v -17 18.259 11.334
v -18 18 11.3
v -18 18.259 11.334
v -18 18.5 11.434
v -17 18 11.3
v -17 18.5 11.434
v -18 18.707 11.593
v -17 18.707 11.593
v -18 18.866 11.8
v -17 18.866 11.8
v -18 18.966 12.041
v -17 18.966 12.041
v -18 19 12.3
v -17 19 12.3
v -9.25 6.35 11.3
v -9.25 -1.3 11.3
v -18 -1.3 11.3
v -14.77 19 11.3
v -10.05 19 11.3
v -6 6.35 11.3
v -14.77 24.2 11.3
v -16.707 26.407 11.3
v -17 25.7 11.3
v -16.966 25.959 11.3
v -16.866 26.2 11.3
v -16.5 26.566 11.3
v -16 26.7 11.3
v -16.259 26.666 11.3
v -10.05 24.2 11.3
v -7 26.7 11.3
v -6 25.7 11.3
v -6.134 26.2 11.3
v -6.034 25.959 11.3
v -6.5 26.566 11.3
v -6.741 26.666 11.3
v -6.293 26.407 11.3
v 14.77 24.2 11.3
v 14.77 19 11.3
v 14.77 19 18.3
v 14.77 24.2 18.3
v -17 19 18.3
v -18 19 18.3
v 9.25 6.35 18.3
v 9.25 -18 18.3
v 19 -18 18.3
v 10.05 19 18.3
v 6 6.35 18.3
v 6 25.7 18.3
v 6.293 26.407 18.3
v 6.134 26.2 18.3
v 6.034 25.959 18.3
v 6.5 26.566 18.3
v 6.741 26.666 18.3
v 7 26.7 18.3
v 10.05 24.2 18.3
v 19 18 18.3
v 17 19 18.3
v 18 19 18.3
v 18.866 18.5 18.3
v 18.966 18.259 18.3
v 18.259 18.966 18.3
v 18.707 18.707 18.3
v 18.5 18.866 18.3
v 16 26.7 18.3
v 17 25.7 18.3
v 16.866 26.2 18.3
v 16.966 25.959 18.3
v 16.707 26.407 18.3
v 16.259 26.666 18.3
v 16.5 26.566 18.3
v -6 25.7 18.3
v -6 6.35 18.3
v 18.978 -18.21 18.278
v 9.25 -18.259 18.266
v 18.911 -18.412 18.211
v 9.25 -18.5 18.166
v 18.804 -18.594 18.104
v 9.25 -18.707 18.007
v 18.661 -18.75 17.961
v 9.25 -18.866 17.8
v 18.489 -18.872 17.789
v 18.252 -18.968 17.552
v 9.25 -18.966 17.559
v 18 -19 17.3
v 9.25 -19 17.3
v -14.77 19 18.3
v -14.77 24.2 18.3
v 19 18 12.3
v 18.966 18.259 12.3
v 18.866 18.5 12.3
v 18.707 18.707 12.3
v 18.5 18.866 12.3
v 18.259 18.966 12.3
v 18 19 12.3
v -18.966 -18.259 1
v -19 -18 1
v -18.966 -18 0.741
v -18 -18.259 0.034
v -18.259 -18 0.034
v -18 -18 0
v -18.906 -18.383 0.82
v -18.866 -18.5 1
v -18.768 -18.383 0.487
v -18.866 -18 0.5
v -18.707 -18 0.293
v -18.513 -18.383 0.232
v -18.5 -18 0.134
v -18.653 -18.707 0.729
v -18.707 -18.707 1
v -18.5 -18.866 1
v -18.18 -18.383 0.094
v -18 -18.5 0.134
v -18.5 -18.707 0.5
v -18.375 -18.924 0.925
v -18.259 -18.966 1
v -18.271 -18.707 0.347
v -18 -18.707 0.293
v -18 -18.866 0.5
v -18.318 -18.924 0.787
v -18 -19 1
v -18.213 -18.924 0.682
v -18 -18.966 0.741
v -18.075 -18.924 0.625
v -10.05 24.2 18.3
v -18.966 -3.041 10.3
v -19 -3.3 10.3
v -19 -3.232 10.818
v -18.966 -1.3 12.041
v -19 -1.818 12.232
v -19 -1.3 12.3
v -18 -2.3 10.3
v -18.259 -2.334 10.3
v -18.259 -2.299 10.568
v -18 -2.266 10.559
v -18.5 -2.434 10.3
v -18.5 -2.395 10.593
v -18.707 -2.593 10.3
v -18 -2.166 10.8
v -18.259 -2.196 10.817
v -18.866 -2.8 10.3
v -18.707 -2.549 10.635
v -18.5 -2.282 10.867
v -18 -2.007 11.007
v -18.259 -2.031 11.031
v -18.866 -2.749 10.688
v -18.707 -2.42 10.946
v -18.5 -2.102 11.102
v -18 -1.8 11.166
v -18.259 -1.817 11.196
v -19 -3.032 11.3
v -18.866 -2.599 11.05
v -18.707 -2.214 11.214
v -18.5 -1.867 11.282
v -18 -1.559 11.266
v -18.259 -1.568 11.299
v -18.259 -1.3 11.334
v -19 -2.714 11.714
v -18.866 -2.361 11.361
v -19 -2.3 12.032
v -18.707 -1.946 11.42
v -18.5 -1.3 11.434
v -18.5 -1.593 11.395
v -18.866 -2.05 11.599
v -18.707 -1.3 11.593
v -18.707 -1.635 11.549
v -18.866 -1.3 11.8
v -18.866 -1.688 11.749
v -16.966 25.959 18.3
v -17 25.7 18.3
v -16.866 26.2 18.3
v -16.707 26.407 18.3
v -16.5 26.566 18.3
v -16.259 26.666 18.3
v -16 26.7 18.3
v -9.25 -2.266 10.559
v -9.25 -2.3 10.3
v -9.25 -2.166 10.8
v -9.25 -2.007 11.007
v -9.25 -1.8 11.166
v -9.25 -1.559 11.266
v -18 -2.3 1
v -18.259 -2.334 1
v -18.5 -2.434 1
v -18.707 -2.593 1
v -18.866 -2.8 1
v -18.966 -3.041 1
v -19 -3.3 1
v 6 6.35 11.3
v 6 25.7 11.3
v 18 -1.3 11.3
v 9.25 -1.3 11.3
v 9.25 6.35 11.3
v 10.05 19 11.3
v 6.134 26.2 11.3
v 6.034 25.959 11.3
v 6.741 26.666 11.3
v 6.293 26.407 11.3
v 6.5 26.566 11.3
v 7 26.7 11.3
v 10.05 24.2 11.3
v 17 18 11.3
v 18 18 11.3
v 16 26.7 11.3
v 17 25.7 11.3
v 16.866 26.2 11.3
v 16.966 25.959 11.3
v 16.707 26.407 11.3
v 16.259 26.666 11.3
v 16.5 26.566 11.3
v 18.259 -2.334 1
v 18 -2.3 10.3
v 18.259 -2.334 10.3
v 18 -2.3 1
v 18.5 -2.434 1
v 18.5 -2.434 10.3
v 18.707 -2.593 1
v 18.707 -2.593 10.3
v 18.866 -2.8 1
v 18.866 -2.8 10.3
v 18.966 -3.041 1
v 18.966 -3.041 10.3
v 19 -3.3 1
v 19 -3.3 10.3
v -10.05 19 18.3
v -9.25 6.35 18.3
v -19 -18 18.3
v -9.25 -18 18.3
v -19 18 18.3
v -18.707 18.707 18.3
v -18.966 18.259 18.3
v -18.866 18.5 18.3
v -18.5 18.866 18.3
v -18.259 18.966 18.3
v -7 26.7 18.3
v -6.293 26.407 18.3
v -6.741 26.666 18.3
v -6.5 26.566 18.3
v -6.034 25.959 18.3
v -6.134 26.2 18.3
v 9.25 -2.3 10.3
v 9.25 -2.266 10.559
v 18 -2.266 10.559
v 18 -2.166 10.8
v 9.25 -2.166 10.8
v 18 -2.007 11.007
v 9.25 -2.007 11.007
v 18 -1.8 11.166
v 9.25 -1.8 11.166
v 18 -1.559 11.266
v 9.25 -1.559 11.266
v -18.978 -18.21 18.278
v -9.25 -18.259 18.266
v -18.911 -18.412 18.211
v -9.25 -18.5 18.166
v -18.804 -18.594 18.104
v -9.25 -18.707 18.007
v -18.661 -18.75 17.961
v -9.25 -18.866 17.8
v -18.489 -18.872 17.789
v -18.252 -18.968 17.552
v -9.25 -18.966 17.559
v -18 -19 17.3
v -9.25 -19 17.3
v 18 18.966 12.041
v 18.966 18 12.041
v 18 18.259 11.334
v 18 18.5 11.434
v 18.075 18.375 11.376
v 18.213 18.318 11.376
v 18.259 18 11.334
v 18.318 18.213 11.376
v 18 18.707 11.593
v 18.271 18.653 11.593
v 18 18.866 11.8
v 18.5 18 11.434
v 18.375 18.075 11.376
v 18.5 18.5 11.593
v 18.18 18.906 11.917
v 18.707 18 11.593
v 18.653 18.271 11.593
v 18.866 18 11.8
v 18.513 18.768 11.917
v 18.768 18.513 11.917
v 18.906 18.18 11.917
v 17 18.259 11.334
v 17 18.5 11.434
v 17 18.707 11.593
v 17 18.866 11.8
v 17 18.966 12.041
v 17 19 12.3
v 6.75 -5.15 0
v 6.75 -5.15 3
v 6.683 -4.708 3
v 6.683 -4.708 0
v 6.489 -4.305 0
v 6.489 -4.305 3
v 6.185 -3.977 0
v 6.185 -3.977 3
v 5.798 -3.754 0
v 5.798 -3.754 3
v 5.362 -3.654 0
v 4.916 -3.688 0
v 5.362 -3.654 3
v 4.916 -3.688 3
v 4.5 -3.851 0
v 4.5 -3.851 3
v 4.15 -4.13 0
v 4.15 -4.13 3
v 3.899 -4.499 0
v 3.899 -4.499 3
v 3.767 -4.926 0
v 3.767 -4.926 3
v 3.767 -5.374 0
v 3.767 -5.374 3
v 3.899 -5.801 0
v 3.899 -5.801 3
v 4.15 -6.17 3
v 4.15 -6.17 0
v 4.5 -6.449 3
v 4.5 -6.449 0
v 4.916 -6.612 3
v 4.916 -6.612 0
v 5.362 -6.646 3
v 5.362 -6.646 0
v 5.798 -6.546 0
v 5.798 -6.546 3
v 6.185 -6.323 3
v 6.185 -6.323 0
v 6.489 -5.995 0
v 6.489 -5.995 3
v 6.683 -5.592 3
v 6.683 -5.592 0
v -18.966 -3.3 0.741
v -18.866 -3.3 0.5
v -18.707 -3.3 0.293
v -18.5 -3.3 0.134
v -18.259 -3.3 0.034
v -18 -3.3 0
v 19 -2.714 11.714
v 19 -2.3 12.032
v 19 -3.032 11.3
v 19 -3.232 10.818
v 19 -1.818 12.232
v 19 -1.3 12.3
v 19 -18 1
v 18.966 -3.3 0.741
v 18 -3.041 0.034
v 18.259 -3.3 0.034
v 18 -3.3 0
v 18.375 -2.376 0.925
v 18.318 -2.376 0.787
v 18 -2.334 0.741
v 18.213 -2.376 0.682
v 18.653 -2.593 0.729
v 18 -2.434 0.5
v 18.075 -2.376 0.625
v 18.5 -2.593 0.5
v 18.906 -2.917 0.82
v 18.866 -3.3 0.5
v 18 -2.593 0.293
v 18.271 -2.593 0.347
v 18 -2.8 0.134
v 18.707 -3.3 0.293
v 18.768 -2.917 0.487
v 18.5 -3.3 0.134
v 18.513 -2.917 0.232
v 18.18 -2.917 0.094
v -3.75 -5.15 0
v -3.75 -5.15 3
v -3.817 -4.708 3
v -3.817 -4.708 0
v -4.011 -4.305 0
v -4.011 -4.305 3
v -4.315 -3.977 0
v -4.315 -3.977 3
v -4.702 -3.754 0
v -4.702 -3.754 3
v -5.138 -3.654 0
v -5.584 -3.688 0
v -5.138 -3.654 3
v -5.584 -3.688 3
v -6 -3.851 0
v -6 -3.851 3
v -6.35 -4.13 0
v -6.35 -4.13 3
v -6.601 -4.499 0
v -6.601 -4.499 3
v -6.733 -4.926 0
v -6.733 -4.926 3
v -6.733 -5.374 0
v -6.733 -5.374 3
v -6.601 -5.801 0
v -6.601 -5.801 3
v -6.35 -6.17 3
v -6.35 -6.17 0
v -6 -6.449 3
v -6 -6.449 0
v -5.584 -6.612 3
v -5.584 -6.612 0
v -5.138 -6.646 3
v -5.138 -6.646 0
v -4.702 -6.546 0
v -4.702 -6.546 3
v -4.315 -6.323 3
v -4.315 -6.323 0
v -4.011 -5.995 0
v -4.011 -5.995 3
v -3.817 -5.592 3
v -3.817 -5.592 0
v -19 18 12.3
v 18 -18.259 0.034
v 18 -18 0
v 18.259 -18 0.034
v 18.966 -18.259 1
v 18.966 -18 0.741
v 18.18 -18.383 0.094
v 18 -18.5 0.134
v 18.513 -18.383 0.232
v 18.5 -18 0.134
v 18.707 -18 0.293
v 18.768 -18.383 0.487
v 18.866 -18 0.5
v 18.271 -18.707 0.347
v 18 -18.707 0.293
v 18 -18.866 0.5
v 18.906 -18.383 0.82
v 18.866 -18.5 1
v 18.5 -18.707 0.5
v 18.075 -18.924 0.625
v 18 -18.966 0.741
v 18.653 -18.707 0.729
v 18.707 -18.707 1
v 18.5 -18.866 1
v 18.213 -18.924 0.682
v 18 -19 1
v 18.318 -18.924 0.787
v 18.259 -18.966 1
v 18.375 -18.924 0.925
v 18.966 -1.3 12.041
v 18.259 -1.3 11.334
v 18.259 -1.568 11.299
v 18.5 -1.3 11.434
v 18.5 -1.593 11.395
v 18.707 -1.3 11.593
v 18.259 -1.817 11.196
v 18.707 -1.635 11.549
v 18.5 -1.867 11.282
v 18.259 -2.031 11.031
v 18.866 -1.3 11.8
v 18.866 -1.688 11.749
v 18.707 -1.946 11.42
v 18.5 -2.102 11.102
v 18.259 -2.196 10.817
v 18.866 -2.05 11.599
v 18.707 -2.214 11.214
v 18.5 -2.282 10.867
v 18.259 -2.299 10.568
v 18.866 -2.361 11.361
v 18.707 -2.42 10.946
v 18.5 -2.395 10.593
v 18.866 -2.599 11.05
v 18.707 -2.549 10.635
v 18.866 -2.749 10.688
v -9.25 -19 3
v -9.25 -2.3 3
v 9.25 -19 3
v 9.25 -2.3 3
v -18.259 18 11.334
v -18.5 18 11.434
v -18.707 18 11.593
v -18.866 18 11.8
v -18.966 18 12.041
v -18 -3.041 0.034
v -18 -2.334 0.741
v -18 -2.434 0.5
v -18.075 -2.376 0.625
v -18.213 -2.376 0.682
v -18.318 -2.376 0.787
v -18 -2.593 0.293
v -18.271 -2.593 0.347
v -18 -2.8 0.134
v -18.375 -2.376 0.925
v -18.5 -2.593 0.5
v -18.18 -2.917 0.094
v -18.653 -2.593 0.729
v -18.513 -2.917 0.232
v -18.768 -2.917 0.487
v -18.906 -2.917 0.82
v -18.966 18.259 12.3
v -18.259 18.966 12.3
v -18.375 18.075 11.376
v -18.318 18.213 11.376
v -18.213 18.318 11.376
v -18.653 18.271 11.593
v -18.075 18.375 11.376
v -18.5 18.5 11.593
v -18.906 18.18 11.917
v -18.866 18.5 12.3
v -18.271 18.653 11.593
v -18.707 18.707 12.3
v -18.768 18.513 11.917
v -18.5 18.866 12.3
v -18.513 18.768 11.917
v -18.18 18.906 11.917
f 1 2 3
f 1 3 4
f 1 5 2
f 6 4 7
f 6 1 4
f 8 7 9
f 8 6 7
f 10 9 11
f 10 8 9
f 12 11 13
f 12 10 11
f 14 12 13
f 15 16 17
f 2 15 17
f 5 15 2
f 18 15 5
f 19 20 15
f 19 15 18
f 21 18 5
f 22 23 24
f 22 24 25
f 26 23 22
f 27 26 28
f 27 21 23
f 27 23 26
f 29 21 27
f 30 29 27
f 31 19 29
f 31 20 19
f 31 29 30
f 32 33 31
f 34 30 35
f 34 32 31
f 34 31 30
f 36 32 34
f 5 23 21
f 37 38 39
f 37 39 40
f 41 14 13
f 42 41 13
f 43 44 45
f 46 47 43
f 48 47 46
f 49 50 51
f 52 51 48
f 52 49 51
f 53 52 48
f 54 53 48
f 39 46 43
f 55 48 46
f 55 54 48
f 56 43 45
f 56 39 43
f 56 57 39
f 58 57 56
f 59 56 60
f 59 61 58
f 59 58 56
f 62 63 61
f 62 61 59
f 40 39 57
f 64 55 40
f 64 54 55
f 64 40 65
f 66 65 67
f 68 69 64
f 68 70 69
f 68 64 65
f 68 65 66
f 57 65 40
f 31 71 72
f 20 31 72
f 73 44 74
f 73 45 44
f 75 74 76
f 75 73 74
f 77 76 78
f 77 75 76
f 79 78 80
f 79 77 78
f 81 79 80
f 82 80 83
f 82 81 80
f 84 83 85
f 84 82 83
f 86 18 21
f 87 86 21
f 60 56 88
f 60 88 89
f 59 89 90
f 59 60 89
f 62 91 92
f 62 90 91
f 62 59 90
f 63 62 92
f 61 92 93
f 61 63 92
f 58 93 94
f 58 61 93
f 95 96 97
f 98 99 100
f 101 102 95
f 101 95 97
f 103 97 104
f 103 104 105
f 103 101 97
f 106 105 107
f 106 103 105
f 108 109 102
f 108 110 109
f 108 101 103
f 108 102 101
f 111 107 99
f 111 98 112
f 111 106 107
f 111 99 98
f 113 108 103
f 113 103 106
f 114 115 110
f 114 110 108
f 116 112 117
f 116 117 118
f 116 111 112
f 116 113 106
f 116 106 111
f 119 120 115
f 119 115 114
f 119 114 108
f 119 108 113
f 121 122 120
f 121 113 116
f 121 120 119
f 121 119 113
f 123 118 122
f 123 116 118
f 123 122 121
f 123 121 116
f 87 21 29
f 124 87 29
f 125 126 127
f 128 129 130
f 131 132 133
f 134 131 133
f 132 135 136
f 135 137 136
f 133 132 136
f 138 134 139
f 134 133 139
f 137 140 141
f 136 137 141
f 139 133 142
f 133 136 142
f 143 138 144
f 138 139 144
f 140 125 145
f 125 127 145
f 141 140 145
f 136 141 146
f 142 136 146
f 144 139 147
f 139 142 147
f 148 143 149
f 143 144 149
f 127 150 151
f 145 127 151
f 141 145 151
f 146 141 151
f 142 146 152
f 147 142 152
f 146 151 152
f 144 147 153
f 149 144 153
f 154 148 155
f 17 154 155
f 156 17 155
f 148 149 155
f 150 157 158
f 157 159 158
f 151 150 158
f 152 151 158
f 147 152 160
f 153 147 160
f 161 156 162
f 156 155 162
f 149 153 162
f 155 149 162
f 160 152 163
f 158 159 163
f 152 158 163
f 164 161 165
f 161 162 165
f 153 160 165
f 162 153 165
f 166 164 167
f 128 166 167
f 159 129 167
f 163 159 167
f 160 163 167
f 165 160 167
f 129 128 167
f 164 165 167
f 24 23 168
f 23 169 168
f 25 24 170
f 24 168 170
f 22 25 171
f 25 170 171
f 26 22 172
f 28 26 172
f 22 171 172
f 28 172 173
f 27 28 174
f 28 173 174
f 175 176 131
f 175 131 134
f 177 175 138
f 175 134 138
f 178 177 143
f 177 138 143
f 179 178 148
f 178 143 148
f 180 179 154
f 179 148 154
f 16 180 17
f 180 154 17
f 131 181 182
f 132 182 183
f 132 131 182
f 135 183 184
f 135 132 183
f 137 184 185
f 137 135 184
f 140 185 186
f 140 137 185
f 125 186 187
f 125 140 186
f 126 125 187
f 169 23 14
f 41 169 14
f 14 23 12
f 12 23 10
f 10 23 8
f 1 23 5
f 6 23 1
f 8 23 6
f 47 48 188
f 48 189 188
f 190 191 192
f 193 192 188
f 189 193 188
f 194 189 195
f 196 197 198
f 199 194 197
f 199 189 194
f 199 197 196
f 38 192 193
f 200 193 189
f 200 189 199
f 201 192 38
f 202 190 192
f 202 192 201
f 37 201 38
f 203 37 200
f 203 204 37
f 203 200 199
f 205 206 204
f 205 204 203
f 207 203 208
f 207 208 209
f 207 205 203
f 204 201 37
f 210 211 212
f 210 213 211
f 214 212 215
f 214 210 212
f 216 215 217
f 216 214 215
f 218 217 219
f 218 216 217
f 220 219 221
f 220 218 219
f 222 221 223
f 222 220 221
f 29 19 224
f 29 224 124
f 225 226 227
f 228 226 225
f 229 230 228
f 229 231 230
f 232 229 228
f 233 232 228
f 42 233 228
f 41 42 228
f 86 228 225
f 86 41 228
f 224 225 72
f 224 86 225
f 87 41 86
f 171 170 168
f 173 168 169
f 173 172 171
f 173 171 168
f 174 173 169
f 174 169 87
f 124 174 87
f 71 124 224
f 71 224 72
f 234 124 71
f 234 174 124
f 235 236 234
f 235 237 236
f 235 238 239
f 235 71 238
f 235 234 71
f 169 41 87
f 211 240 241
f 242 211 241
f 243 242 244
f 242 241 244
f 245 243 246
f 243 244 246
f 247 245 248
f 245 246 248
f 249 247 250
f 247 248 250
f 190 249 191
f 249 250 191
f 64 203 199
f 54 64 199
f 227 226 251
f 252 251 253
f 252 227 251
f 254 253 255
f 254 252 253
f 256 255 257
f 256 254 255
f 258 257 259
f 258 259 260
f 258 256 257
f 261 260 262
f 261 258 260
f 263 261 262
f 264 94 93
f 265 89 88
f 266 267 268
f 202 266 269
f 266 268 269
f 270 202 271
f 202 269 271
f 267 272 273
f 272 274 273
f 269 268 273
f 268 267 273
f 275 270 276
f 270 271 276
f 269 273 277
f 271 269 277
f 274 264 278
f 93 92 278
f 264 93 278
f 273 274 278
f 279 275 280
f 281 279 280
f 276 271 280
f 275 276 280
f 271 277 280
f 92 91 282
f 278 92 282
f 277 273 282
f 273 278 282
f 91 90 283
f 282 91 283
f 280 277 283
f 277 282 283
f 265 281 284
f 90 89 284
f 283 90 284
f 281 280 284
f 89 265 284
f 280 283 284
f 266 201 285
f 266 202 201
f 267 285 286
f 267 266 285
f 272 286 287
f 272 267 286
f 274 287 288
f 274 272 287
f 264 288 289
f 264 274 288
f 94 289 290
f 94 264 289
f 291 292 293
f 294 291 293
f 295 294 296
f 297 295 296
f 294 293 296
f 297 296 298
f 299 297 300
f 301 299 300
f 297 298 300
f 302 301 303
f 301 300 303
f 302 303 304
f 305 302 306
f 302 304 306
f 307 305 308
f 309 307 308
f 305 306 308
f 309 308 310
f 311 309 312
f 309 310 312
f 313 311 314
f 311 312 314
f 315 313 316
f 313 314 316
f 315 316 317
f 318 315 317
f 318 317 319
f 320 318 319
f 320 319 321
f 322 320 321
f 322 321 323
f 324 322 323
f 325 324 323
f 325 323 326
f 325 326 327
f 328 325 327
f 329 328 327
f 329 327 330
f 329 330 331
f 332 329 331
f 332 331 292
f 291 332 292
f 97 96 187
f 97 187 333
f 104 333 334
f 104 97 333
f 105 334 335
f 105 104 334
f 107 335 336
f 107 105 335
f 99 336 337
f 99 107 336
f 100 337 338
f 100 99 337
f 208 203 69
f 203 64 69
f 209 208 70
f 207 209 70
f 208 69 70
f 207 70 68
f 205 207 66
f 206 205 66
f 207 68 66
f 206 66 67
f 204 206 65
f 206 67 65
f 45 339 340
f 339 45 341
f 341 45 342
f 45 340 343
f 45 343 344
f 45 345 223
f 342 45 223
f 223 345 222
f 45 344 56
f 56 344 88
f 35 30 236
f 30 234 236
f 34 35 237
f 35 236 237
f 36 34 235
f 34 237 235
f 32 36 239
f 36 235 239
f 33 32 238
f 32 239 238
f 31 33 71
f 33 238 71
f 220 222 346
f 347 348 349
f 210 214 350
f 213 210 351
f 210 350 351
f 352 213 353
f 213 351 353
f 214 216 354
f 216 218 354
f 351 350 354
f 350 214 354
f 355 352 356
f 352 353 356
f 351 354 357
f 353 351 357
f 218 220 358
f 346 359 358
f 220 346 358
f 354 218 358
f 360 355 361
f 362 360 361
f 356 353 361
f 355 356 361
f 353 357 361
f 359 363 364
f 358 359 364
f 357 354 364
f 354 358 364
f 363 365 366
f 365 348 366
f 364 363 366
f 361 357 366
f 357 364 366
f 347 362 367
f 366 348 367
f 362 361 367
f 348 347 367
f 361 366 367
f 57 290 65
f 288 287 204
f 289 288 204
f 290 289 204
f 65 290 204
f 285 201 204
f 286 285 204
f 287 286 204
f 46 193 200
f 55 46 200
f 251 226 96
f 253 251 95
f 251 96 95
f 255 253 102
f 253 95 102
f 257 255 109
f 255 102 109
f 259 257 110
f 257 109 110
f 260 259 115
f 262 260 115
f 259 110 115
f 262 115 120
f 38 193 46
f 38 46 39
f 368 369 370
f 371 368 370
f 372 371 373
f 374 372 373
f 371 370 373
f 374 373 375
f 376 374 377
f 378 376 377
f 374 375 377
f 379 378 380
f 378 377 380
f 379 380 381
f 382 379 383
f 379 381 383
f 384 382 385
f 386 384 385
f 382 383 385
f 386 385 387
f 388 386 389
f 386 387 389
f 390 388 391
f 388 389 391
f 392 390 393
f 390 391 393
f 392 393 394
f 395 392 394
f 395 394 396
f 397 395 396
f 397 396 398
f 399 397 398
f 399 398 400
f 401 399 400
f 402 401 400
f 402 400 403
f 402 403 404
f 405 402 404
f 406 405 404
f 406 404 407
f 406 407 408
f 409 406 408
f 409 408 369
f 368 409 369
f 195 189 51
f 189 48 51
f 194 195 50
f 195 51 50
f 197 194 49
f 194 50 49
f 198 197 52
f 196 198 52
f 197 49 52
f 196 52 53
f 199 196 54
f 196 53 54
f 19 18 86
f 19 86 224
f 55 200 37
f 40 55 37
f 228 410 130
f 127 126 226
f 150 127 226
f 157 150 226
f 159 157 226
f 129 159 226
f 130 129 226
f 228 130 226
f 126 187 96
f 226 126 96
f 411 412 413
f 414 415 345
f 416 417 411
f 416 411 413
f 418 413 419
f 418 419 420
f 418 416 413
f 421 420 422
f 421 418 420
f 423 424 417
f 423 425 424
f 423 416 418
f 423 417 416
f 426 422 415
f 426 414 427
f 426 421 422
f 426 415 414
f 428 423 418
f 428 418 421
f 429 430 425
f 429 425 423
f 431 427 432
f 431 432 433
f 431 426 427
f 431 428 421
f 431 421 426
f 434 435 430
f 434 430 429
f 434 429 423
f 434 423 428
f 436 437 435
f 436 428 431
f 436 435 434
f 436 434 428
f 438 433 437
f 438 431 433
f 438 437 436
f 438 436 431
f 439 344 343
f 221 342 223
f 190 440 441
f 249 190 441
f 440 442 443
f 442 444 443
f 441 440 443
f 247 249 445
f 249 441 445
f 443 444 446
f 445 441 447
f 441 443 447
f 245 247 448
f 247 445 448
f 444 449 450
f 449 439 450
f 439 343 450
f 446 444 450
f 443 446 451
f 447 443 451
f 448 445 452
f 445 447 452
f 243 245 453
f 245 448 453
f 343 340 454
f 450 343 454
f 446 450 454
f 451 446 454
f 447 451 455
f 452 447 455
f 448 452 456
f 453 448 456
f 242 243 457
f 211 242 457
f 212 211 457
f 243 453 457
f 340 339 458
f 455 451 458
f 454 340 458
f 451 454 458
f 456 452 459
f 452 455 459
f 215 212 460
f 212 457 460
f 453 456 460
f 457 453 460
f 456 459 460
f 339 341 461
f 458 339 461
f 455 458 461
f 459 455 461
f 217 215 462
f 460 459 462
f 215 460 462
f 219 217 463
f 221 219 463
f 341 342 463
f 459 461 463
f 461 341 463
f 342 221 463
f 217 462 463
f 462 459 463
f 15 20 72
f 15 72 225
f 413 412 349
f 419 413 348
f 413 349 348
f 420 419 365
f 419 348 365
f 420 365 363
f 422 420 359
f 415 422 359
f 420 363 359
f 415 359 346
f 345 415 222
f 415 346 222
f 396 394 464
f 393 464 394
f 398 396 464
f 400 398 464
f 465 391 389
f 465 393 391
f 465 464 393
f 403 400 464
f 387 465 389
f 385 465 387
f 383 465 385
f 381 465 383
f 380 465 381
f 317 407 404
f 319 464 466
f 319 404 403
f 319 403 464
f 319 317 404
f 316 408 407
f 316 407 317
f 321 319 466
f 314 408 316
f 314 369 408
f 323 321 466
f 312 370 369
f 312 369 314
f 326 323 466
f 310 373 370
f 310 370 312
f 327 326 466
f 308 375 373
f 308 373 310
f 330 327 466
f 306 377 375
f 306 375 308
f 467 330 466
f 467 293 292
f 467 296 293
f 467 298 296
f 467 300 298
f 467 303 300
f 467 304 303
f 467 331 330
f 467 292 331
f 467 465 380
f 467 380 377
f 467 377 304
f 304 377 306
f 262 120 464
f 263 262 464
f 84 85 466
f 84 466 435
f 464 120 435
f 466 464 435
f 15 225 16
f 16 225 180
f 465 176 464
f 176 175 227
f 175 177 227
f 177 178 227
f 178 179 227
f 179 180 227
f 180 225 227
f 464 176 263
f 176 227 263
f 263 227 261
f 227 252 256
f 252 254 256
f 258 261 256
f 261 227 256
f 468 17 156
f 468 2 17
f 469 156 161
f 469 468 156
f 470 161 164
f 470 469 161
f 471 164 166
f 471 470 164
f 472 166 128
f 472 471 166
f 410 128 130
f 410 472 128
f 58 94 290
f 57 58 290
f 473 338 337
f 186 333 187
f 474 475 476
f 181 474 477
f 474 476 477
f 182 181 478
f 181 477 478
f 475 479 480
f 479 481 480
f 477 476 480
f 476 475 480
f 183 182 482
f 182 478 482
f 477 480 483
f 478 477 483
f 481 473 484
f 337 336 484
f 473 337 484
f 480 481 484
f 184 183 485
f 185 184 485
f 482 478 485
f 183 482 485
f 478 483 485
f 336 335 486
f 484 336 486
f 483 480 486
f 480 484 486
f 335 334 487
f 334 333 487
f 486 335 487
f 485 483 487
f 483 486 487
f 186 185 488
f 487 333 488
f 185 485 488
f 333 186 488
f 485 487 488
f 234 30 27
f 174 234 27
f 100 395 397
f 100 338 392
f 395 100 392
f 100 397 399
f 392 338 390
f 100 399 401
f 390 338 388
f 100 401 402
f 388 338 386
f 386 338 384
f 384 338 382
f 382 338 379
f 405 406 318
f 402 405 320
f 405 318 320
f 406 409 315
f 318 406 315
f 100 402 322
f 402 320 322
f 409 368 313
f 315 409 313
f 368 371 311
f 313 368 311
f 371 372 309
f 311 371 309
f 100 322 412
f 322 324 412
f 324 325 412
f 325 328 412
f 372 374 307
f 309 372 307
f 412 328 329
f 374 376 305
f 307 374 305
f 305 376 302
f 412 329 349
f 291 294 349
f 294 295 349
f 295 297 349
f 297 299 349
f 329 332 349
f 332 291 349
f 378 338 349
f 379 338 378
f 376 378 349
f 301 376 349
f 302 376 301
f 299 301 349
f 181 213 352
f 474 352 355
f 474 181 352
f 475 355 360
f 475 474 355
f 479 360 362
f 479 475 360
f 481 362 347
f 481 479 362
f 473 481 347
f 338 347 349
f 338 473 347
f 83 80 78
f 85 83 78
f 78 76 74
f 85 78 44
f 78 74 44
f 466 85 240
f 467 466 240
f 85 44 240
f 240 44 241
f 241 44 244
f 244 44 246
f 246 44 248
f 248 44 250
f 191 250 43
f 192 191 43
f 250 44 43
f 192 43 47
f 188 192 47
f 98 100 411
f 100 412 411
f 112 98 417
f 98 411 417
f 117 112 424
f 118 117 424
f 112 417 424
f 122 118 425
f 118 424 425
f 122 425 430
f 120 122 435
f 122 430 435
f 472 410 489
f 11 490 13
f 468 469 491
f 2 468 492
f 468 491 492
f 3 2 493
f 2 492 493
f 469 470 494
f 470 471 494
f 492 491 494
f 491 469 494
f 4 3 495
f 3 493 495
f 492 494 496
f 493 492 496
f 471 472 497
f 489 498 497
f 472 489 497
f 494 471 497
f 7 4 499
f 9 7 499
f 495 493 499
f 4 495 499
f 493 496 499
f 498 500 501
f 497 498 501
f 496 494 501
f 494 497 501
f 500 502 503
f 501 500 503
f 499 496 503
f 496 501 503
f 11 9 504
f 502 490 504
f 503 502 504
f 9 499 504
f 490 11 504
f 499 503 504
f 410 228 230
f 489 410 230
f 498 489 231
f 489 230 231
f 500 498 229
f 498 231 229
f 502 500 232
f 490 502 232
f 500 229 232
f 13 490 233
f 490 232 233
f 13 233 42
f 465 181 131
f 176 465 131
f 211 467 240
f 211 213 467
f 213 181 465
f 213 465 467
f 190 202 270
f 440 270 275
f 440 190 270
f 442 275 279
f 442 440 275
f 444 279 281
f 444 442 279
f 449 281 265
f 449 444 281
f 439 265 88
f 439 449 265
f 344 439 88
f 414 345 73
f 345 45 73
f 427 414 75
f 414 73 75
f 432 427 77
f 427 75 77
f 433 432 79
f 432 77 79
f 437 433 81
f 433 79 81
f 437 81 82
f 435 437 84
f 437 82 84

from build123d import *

# Parameters (mm, degrees)
SKETCH_W        = 4.72
SKETCH_H        = 5.2
PAD_DEPTH       = 18.3
SKETCH001_W     = 29
SKETCH001_H     = 11.3
POCKET_DEPTH    = 38.001
POCKET005_DEPTH = 15.3
SKETCH003_R     = 1.5
POCKET006_DEPTH = 5
FILLET_R        = 1
FILLET001_R     = 1
FILLET002_R     = 1
FILLET003_R     = 1
FILLET004_R     = 1


with BuildPart() as part:
    # Sketch → Pad (new body)
    with BuildSketch(Plane.XY):
        Polygon((-19, 19), (-19, -19), (19, -19), (19, 19), (17, 19), (17, 26.7), (6, 26.7), (6, 19), (-6, 19), (-6, 26.7), (-17, 26.7), (-17, 19), align=None)
        with Locations((-12.41, 21.6)):
            Rectangle(SKETCH_W, SKETCH_H, mode=Mode.SUBTRACT)
        with Locations((12.41, 21.6)):
            Rectangle(SKETCH_W, SKETCH_H, mode=Mode.SUBTRACT)
    extrude(amount=PAD_DEPTH)

    # Sketch001 (on Face3 of Pad) → Pocket (cut, through all)
    with BuildSketch(Plane.YZ.offset(19)):
        with Locations((12.2, 5.65)):
            Rectangle(SKETCH001_W, SKETCH001_H)
    extrude(amount=-POCKET_DEPTH, mode=Mode.SUBTRACT)

    # Sketch002 (on Face6 of Pocket) → Pocket005 (cut)
    with BuildSketch(Plane.XY.offset(18.3)):
        Polygon((-9.25, -19), (9.25, -19), (9.25, 6.35), (6, 6.35), (6, 19), (-6, 19), (-6, 6.35), (-9.25, 6.35), align=None)
    extrude(amount=-POCKET005_DEPTH, mode=Mode.SUBTRACT)

    # Sketch003 → Pocket006 (cut)
    with BuildSketch(Plane.XY.offset(4)):
        with Locations((-5.25, -5.15)):
            Circle(SKETCH003_R)
        with Locations((5.25, -5.15)):
            Circle(SKETCH003_R)
    extrude(amount=-POCKET006_DEPTH, mode=Mode.SUBTRACT)

    # Fillet
    fillet_edges = [part.edges().sort_by_distance(p)[0] for p in [
        (19, 19, 14.8),
        (17, 26.7, 14.8),
        (6, 26.7, 14.8),
        (-6, 26.7, 14.8),
        (-17, 26.7, 14.8),
        (-19, 19, 14.8),
    ]]
    fillet(fillet_edges, radius=FILLET_R)

    # Fillet001
    fillet001_edges = [part.edges().sort_by_distance(p)[0] for p in [
        (19, -10.65, 0),
        (-19, -10.65, 0),
    ]]
    fillet(fillet001_edges, radius=FILLET001_R)

    # Fillet002
    fillet002_edges = [part.edges().sort_by_distance(p)[0] for p in [
        (14.125, -2.3, 11.3),
        (-14.125, -2.3, 11.3),
    ]]
    fillet(fillet002_edges, radius=FILLET002_R)

    # Fillet003
    fillet003_edges = [part.edges().sort_by_distance(p)[0] for p in [
        (0, -2.3, 0),
    ]]
    fillet(fillet003_edges, radius=FILLET003_R)

    # Fillet004
    fillet004_edges = [part.edges().sort_by_distance(p)[0] for p in [
        (0, -19, 0),
        (19, -19, 9.65),
        (-19, -19, 9.65),
        (-14.125, -19, 18.3),
        (14.125, -19, 18.3),
    ]]
    fillet(fillet004_edges, radius=FILLET004_R)


solid = part.part
